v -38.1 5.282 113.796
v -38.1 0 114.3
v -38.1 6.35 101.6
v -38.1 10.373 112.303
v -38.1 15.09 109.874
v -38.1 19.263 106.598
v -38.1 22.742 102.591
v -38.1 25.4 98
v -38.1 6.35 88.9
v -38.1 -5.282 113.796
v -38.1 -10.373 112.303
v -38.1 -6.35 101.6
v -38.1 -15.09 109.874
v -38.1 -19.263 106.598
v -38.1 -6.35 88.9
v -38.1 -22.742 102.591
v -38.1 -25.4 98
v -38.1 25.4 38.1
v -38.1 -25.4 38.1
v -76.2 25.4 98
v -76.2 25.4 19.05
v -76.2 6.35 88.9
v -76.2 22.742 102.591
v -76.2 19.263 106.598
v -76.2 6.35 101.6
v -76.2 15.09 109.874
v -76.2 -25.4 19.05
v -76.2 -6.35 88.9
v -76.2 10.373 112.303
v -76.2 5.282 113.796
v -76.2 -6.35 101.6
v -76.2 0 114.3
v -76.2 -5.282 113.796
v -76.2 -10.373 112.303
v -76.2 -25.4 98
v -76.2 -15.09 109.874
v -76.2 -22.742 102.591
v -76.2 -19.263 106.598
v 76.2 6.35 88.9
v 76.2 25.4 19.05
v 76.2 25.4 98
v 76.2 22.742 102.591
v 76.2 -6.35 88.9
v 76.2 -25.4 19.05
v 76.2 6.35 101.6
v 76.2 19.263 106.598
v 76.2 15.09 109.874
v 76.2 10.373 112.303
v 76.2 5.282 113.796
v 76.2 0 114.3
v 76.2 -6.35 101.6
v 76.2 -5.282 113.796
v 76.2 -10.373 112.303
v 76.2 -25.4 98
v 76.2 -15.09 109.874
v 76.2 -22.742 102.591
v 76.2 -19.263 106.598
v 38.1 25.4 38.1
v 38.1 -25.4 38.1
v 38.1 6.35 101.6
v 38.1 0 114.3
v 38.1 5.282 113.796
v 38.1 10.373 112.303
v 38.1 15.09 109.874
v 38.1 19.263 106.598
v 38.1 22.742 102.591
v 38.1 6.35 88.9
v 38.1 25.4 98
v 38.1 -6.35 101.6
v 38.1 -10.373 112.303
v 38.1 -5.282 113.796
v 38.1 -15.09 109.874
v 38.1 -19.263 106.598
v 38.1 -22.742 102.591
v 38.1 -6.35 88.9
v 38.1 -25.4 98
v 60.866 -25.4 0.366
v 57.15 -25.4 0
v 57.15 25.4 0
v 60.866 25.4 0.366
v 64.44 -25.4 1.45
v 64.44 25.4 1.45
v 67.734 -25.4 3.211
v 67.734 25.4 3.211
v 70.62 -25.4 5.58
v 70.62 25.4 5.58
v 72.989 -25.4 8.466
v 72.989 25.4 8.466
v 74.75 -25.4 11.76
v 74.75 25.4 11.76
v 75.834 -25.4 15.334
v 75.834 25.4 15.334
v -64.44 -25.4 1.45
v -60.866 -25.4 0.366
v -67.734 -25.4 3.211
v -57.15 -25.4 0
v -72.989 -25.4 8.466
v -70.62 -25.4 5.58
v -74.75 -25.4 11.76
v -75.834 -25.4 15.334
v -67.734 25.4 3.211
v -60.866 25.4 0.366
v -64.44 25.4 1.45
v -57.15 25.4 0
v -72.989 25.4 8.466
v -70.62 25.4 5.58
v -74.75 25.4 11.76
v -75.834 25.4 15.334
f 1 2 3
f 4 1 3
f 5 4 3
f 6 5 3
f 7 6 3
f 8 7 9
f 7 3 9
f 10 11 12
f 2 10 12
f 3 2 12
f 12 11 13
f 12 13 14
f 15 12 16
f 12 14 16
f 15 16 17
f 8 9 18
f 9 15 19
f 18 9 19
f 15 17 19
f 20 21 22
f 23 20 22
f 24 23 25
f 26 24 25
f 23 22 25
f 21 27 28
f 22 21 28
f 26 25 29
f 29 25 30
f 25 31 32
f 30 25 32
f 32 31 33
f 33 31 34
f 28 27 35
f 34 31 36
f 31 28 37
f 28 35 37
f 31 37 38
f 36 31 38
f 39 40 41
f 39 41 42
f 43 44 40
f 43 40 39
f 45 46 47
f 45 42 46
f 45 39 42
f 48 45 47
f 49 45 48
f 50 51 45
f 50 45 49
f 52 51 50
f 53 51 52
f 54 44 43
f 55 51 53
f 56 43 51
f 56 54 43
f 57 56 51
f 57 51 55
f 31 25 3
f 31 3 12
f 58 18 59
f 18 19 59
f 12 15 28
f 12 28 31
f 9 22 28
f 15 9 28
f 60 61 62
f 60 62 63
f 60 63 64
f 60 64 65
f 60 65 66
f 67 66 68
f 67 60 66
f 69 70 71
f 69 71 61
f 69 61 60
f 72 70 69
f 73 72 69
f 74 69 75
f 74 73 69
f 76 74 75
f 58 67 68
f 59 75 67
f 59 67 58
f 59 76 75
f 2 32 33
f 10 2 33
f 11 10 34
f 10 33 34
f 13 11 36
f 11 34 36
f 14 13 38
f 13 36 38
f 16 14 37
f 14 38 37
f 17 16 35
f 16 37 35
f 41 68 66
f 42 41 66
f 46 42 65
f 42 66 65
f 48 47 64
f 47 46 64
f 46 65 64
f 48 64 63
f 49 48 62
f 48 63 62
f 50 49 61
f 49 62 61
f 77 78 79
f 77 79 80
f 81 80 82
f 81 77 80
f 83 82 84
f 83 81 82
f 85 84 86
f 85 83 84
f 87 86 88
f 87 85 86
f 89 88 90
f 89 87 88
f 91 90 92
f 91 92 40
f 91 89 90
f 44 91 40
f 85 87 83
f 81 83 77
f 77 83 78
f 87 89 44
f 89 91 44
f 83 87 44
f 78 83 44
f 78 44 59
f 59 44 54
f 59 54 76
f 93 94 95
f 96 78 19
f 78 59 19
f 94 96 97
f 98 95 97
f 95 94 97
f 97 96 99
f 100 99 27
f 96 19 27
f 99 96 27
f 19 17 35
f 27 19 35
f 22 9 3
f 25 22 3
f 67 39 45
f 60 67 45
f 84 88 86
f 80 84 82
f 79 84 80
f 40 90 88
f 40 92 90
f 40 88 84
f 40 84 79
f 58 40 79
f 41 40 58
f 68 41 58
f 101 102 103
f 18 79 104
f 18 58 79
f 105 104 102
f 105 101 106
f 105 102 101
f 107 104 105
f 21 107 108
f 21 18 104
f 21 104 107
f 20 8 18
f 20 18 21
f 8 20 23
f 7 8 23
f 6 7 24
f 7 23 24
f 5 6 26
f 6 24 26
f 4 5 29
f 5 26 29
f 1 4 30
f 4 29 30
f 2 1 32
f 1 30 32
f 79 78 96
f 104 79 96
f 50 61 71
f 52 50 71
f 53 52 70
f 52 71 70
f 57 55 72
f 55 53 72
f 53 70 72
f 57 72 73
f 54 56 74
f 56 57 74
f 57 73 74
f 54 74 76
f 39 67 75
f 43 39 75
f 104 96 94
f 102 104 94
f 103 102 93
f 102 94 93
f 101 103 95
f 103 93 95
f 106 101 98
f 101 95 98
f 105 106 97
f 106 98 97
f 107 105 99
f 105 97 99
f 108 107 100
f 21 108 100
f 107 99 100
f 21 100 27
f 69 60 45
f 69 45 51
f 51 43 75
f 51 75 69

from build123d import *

# Parameters (mm, degrees)
F1_DEPTH = 25.4
F3_W     = 12.7
F3_H     = 12.7
F4_DEPTH = 152.401


with BuildPart() as f1:
    # F0 (on Front) → F1 (new body, symmetric)
    with BuildSketch(Plane.XZ):
        with BuildLine():
            Line((0, 38.1), (0, 0))
            Line((0, 0), (38.1, 0))
            Line((38.1, 0), (57.15, 0))
            ThreePointArc((57.15, 0), (70.620384, 5.579616), (76.2, 19.05))
            Line((76.2, 19.05), (76.2, 38.1))
            Line((76.2, 38.1), (76.2, 114.3))
            Line((76.2, 114.3), (38.1, 114.3))
            Line((38.1, 114.3), (38.1, 38.1))
            Line((38.1, 38.1), (0, 38.1))
        make_face()
    extrude(amount=F1_DEPTH, both=True)

    # F2: F1 across plane


with BuildPart() as f1_1:
    add(f1.part)
    add(f1.part.mirror(Plane.YZ))

    # F3 (on face) → F4 (cut, through all)
    with BuildSketch(Plane(origin=(-76.2, 0, 0), x_dir=(0, -1, 0), z_dir=(-1, 0, 0))):
        with BuildLine():
            ThreePointArc((-25.4, 97.999742), (-15.090215, 109.874442), (0, 114.3))
            Line((0, 114.3), (-25.4, 114.3))
            Line((-25.4, 114.3), (-25.4, 97.999742))
        make_face()
        with BuildLine():
            ThreePointArc((0, 114.3), (15.090215, 109.874442), (25.4, 97.999742))
            Line((25.4, 97.999742), (25.4, 114.3))
            Line((25.4, 114.3), (0, 114.3))
        make_face()
        with Locations((0, 95.25)):
            Rectangle(F3_W, F3_H)
    extrude(amount=-F4_DEPTH, mode=Mode.SUBTRACT)


solid = f1_1.part
